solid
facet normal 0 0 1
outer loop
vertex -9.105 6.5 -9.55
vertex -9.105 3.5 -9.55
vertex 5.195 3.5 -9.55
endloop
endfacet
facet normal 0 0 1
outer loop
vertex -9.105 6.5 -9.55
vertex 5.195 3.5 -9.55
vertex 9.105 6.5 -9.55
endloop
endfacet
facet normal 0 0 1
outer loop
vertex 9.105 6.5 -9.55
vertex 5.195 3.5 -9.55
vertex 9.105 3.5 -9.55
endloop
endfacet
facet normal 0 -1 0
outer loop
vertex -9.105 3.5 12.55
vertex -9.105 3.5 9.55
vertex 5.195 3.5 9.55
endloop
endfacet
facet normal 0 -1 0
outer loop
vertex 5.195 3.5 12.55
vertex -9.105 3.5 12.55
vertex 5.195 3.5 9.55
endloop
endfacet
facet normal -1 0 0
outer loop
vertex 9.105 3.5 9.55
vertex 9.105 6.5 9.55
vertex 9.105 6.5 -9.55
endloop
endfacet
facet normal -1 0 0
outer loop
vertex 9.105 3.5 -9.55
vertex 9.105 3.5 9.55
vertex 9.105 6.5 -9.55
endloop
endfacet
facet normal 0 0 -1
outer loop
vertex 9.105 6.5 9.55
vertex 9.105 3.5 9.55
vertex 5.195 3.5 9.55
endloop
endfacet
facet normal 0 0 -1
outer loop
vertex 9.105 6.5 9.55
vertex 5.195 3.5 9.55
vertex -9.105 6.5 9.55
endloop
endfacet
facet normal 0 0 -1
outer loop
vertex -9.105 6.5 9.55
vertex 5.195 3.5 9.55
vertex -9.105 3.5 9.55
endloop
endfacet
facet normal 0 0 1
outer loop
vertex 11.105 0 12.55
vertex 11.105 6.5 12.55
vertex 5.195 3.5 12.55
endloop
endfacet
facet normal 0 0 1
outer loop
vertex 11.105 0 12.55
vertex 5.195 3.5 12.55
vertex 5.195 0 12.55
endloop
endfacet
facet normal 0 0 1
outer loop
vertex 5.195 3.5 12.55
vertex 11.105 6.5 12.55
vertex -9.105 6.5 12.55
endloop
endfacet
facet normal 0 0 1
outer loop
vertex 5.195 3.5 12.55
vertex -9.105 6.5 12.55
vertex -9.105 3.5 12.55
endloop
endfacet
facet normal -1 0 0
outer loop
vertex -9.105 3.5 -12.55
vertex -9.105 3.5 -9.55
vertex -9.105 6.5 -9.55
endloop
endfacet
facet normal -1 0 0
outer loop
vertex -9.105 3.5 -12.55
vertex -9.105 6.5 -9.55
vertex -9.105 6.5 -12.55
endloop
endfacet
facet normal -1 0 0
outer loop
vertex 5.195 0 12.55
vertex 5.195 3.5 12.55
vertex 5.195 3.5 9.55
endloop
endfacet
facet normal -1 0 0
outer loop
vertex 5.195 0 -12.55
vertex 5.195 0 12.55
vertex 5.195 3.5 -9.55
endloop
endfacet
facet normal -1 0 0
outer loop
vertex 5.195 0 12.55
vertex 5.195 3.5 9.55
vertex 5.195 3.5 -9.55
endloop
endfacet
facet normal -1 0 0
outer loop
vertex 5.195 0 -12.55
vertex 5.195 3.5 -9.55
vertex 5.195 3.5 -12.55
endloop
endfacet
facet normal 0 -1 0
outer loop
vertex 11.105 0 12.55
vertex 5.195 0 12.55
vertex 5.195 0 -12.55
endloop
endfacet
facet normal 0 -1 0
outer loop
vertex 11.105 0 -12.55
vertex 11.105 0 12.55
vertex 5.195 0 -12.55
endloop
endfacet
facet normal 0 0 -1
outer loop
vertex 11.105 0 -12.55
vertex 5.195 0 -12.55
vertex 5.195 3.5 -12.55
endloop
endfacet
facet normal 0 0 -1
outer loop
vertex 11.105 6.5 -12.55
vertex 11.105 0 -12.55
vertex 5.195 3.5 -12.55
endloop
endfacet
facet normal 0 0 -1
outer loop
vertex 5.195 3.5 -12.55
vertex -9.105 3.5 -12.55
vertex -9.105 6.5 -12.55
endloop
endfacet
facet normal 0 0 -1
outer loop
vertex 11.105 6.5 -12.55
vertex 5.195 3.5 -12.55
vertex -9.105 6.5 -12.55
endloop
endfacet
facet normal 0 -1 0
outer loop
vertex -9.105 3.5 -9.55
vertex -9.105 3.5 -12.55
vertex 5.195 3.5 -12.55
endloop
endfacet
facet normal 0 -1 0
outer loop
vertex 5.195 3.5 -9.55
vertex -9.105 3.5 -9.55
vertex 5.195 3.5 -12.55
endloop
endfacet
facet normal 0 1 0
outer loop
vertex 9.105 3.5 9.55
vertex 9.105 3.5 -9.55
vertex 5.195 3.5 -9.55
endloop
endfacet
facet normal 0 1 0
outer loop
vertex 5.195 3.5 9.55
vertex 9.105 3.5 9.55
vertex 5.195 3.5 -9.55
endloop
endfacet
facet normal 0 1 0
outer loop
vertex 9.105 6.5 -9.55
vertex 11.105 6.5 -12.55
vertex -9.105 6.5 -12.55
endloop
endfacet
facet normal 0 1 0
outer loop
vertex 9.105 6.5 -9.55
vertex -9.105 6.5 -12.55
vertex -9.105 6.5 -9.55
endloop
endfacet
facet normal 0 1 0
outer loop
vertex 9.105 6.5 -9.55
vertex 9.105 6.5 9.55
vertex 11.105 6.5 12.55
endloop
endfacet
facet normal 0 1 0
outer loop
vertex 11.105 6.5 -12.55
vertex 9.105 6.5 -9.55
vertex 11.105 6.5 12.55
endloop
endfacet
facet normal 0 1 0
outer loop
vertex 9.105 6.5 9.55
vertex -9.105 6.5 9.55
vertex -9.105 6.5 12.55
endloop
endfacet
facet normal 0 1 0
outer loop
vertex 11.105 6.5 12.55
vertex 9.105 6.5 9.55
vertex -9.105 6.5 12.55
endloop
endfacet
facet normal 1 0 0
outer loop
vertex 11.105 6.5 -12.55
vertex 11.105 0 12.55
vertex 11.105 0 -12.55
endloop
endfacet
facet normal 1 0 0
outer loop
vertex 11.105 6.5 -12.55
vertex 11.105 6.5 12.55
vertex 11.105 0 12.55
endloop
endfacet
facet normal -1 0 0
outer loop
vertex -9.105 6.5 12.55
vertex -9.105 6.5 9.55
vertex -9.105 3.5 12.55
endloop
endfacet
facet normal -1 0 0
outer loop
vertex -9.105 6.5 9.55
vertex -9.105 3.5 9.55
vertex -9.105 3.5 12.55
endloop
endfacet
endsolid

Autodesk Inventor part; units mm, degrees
ref_plane "YZ Plane" through (0, 0, 0) normal (1, 0, 0) x (0, 1, 0)
ref_plane "XZ Plane" through (0, 0, 0) normal (0, 1, 0) x (-1, 0, 0)
ref_plane "XY Plane" through (0, 0, 0) normal (0, 0, 1) x (1, 0, 0)
sketch "Skizze1" plane through (0, 0, 0) normal (0, 1, 0) x (-1, 0, 0)
  line L0 (9.105, 12) -> (-9.105, 12)
  line L1 (-9.105, 12) -> (-9.105, -12)
  line L2 (-9.105, -12) -> (9.105, -12)
  line L3 (9.105, -12) -> (9.105, 12)
  line L4 (9.105, 12) -> (-9.105, -12) construction
  line L5 (-9.105, 12) -> (9.105, -12) construction
  point P0 (0, 0)
  dimension "d0" = 18.21
  dimension "d1" = 24
extrude "Extrusion1" add sketch "Skizze1" along normal blind 3.5
sketch "Skizze2" plane through (0, 3.5, 0) normal (0, 1, 0) x (1, 0, 0)
  line L0 (9.105, -12) -> (9.105, 12) projected
  line L1 (9.105, 12) -> (-9.105, 12) projected
  line L2 (9.105, -12) -> (5.195, -12)
  line L3 (5.195, -12) -> (5.195, 12)
  line L4 (5.195, 12) -> (9.105, 12)
  line L5 (9.105, 12) -> (9.105, -12)
  line L6 (9.105, -12) -> (9.105, 12) projected
  line L7 (9.105, 12) -> (-9.105, 12) projected
  line L8 (-9.105, 12) -> (-9.105, -12) projected
  line L9 (-9.105, -12) -> (9.105, -12) projected
  point P0 (0, 0)
  dimension "d4" = 3.91
extrude "Extrusion2" cut sketch "Skizze2" against normal through all contours L9 L8 L1 L3
sketch "Skizze3" plane through (0, 3.5, 0) normal (0, 1, 0) x (1, 0, 0)
  line L0 (13.39, -9.55) -> (-3, -9.55)
  line L1 (-3, -9.55) -> (-3, 9.55)
  line L2 (-3, 9.55) -> (13.39, 9.55)
  line L3 (13.39, 9.55) -> (13.39, -9.55)
  line L4 (5.195, 12) -> (5.195, -12) projected
  line L5 (13.39, -9.55) -> (-3, 9.55) construction
  line L6 (-3, -9.55) -> (13.39, 9.55) construction
  line L7 (9.105, -12) -> (9.105, 12) projected
  line L8 (9.105, -9.55) -> (-9.105, -9.55)
  line L9 (-9.105, -9.55) -> (-9.105, -12.55)
  line L10 (-9.105, -12.55) -> (9.105, -12.55)
  line L11 (9.105, -12.55) -> (9.105, -9.55)
  line L12 (9.105, 9.55) -> (-9.105, 9.55)
  line L13 (-9.105, 9.55) -> (-9.105, 12.55)
  line L14 (-9.105, 12.55) -> (9.105, 12.55)
  line L15 (9.105, 12.55) -> (9.105, 9.55)
  point P0 (0, 0)
  point P1 (5.195, 0)
  dimension "d7" = 19.1
  dimension "d8" = 18.21
  dimension "d9" = 3
  dimension "d10" = 18.21
  dimension "d11" = 3
extrude "Extrusion3" add sketch "Skizze3" along normal blind 3 contours L7 L11 L10 L9 L8 L0 | L2 L12 L13 L14 L15 L7
sketch "Skizze4" plane through (0, 3.5, 0) normal (0, -1, 0) x (1, 0, 0)
  line L0 (5.195, 12) -> (9.105, 12) projected
  line L1 (9.105, 12.55) -> (9.105, 12) projected
  line L2 (-9.105, 12.55) -> (9.105, 12.55) projected
  line L3 (-9.105, 9.55) -> (-9.105, 12.55) projected
  line L4 (5.195, 9.55) -> (-9.105, 9.55) projected
  line L5 (5.195, 9.55) -> (5.195, 12) projected
  line L6 (5.195, -12) -> (5.195, -9.55) projected
  line L7 (-9.105, -9.55) -> (5.195, -9.55) projected
  line L8 (-9.105, -12.55) -> (-9.105, -9.55) projected
  line L9 (9.105, -12.55) -> (-9.105, -12.55) projected
  line L10 (9.105, -12) -> (9.105, -12.55) projected
  line L11 (9.105, -12) -> (5.195, -12) projected
  line L12 (9.105, 12.55) -> (9.105, 12) projected
  line L13 (9.105, 12.55) -> (5.195, 12.55)
  line L14 (5.195, 12.55) -> (5.195, 9.55)
  line L15 (5.195, 9.55) -> (9.105, 9.55)
  line L16 (9.105, 9.55) -> (9.105, 12.55)
  line L17 (9.105, -12.55) -> (-9.105, -12.55) projected
  line L18 (5.195, -9.55) -> (5.195, 9.55) projected
  line L19 (9.105, -12.55) -> (5.195, -12.55)
  line L20 (5.195, -12.55) -> (5.195, -9.55)
  line L21 (5.195, -9.55) -> (9.105, -9.55)
  line L22 (9.105, -9.55) -> (9.105, -12.55)
  point P0 (0, 0)
extrude "Extrusion4" add sketch "Skizze4" along normal up to surface (3.5 mm away) contours L14 L2 L1 L0 | L0 L16 L15 L5 | L21 L22 L11 L6 | L11 L10 L9 L20
sketch "Skizze5" plane through (9.105, 0, 12.55) normal (1, 0, 0) x (0, 0, -1)
  line L0 (0, 3.5) -> (0, 0) projected
  line L1 (0, 0) -> (25.1, 0)
  line L2 (25.1, 0) -> (25.1, 6.5)
  line L3 (25.1, 6.5) -> (0, 6.5)
  line L4 (0, 6.5) -> (0, 0)
  point P0 (12.55, 0)
extrude "Extrusion5" add sketch "Skizze5" along normal blind 2
properties part number "CentrationTool"
